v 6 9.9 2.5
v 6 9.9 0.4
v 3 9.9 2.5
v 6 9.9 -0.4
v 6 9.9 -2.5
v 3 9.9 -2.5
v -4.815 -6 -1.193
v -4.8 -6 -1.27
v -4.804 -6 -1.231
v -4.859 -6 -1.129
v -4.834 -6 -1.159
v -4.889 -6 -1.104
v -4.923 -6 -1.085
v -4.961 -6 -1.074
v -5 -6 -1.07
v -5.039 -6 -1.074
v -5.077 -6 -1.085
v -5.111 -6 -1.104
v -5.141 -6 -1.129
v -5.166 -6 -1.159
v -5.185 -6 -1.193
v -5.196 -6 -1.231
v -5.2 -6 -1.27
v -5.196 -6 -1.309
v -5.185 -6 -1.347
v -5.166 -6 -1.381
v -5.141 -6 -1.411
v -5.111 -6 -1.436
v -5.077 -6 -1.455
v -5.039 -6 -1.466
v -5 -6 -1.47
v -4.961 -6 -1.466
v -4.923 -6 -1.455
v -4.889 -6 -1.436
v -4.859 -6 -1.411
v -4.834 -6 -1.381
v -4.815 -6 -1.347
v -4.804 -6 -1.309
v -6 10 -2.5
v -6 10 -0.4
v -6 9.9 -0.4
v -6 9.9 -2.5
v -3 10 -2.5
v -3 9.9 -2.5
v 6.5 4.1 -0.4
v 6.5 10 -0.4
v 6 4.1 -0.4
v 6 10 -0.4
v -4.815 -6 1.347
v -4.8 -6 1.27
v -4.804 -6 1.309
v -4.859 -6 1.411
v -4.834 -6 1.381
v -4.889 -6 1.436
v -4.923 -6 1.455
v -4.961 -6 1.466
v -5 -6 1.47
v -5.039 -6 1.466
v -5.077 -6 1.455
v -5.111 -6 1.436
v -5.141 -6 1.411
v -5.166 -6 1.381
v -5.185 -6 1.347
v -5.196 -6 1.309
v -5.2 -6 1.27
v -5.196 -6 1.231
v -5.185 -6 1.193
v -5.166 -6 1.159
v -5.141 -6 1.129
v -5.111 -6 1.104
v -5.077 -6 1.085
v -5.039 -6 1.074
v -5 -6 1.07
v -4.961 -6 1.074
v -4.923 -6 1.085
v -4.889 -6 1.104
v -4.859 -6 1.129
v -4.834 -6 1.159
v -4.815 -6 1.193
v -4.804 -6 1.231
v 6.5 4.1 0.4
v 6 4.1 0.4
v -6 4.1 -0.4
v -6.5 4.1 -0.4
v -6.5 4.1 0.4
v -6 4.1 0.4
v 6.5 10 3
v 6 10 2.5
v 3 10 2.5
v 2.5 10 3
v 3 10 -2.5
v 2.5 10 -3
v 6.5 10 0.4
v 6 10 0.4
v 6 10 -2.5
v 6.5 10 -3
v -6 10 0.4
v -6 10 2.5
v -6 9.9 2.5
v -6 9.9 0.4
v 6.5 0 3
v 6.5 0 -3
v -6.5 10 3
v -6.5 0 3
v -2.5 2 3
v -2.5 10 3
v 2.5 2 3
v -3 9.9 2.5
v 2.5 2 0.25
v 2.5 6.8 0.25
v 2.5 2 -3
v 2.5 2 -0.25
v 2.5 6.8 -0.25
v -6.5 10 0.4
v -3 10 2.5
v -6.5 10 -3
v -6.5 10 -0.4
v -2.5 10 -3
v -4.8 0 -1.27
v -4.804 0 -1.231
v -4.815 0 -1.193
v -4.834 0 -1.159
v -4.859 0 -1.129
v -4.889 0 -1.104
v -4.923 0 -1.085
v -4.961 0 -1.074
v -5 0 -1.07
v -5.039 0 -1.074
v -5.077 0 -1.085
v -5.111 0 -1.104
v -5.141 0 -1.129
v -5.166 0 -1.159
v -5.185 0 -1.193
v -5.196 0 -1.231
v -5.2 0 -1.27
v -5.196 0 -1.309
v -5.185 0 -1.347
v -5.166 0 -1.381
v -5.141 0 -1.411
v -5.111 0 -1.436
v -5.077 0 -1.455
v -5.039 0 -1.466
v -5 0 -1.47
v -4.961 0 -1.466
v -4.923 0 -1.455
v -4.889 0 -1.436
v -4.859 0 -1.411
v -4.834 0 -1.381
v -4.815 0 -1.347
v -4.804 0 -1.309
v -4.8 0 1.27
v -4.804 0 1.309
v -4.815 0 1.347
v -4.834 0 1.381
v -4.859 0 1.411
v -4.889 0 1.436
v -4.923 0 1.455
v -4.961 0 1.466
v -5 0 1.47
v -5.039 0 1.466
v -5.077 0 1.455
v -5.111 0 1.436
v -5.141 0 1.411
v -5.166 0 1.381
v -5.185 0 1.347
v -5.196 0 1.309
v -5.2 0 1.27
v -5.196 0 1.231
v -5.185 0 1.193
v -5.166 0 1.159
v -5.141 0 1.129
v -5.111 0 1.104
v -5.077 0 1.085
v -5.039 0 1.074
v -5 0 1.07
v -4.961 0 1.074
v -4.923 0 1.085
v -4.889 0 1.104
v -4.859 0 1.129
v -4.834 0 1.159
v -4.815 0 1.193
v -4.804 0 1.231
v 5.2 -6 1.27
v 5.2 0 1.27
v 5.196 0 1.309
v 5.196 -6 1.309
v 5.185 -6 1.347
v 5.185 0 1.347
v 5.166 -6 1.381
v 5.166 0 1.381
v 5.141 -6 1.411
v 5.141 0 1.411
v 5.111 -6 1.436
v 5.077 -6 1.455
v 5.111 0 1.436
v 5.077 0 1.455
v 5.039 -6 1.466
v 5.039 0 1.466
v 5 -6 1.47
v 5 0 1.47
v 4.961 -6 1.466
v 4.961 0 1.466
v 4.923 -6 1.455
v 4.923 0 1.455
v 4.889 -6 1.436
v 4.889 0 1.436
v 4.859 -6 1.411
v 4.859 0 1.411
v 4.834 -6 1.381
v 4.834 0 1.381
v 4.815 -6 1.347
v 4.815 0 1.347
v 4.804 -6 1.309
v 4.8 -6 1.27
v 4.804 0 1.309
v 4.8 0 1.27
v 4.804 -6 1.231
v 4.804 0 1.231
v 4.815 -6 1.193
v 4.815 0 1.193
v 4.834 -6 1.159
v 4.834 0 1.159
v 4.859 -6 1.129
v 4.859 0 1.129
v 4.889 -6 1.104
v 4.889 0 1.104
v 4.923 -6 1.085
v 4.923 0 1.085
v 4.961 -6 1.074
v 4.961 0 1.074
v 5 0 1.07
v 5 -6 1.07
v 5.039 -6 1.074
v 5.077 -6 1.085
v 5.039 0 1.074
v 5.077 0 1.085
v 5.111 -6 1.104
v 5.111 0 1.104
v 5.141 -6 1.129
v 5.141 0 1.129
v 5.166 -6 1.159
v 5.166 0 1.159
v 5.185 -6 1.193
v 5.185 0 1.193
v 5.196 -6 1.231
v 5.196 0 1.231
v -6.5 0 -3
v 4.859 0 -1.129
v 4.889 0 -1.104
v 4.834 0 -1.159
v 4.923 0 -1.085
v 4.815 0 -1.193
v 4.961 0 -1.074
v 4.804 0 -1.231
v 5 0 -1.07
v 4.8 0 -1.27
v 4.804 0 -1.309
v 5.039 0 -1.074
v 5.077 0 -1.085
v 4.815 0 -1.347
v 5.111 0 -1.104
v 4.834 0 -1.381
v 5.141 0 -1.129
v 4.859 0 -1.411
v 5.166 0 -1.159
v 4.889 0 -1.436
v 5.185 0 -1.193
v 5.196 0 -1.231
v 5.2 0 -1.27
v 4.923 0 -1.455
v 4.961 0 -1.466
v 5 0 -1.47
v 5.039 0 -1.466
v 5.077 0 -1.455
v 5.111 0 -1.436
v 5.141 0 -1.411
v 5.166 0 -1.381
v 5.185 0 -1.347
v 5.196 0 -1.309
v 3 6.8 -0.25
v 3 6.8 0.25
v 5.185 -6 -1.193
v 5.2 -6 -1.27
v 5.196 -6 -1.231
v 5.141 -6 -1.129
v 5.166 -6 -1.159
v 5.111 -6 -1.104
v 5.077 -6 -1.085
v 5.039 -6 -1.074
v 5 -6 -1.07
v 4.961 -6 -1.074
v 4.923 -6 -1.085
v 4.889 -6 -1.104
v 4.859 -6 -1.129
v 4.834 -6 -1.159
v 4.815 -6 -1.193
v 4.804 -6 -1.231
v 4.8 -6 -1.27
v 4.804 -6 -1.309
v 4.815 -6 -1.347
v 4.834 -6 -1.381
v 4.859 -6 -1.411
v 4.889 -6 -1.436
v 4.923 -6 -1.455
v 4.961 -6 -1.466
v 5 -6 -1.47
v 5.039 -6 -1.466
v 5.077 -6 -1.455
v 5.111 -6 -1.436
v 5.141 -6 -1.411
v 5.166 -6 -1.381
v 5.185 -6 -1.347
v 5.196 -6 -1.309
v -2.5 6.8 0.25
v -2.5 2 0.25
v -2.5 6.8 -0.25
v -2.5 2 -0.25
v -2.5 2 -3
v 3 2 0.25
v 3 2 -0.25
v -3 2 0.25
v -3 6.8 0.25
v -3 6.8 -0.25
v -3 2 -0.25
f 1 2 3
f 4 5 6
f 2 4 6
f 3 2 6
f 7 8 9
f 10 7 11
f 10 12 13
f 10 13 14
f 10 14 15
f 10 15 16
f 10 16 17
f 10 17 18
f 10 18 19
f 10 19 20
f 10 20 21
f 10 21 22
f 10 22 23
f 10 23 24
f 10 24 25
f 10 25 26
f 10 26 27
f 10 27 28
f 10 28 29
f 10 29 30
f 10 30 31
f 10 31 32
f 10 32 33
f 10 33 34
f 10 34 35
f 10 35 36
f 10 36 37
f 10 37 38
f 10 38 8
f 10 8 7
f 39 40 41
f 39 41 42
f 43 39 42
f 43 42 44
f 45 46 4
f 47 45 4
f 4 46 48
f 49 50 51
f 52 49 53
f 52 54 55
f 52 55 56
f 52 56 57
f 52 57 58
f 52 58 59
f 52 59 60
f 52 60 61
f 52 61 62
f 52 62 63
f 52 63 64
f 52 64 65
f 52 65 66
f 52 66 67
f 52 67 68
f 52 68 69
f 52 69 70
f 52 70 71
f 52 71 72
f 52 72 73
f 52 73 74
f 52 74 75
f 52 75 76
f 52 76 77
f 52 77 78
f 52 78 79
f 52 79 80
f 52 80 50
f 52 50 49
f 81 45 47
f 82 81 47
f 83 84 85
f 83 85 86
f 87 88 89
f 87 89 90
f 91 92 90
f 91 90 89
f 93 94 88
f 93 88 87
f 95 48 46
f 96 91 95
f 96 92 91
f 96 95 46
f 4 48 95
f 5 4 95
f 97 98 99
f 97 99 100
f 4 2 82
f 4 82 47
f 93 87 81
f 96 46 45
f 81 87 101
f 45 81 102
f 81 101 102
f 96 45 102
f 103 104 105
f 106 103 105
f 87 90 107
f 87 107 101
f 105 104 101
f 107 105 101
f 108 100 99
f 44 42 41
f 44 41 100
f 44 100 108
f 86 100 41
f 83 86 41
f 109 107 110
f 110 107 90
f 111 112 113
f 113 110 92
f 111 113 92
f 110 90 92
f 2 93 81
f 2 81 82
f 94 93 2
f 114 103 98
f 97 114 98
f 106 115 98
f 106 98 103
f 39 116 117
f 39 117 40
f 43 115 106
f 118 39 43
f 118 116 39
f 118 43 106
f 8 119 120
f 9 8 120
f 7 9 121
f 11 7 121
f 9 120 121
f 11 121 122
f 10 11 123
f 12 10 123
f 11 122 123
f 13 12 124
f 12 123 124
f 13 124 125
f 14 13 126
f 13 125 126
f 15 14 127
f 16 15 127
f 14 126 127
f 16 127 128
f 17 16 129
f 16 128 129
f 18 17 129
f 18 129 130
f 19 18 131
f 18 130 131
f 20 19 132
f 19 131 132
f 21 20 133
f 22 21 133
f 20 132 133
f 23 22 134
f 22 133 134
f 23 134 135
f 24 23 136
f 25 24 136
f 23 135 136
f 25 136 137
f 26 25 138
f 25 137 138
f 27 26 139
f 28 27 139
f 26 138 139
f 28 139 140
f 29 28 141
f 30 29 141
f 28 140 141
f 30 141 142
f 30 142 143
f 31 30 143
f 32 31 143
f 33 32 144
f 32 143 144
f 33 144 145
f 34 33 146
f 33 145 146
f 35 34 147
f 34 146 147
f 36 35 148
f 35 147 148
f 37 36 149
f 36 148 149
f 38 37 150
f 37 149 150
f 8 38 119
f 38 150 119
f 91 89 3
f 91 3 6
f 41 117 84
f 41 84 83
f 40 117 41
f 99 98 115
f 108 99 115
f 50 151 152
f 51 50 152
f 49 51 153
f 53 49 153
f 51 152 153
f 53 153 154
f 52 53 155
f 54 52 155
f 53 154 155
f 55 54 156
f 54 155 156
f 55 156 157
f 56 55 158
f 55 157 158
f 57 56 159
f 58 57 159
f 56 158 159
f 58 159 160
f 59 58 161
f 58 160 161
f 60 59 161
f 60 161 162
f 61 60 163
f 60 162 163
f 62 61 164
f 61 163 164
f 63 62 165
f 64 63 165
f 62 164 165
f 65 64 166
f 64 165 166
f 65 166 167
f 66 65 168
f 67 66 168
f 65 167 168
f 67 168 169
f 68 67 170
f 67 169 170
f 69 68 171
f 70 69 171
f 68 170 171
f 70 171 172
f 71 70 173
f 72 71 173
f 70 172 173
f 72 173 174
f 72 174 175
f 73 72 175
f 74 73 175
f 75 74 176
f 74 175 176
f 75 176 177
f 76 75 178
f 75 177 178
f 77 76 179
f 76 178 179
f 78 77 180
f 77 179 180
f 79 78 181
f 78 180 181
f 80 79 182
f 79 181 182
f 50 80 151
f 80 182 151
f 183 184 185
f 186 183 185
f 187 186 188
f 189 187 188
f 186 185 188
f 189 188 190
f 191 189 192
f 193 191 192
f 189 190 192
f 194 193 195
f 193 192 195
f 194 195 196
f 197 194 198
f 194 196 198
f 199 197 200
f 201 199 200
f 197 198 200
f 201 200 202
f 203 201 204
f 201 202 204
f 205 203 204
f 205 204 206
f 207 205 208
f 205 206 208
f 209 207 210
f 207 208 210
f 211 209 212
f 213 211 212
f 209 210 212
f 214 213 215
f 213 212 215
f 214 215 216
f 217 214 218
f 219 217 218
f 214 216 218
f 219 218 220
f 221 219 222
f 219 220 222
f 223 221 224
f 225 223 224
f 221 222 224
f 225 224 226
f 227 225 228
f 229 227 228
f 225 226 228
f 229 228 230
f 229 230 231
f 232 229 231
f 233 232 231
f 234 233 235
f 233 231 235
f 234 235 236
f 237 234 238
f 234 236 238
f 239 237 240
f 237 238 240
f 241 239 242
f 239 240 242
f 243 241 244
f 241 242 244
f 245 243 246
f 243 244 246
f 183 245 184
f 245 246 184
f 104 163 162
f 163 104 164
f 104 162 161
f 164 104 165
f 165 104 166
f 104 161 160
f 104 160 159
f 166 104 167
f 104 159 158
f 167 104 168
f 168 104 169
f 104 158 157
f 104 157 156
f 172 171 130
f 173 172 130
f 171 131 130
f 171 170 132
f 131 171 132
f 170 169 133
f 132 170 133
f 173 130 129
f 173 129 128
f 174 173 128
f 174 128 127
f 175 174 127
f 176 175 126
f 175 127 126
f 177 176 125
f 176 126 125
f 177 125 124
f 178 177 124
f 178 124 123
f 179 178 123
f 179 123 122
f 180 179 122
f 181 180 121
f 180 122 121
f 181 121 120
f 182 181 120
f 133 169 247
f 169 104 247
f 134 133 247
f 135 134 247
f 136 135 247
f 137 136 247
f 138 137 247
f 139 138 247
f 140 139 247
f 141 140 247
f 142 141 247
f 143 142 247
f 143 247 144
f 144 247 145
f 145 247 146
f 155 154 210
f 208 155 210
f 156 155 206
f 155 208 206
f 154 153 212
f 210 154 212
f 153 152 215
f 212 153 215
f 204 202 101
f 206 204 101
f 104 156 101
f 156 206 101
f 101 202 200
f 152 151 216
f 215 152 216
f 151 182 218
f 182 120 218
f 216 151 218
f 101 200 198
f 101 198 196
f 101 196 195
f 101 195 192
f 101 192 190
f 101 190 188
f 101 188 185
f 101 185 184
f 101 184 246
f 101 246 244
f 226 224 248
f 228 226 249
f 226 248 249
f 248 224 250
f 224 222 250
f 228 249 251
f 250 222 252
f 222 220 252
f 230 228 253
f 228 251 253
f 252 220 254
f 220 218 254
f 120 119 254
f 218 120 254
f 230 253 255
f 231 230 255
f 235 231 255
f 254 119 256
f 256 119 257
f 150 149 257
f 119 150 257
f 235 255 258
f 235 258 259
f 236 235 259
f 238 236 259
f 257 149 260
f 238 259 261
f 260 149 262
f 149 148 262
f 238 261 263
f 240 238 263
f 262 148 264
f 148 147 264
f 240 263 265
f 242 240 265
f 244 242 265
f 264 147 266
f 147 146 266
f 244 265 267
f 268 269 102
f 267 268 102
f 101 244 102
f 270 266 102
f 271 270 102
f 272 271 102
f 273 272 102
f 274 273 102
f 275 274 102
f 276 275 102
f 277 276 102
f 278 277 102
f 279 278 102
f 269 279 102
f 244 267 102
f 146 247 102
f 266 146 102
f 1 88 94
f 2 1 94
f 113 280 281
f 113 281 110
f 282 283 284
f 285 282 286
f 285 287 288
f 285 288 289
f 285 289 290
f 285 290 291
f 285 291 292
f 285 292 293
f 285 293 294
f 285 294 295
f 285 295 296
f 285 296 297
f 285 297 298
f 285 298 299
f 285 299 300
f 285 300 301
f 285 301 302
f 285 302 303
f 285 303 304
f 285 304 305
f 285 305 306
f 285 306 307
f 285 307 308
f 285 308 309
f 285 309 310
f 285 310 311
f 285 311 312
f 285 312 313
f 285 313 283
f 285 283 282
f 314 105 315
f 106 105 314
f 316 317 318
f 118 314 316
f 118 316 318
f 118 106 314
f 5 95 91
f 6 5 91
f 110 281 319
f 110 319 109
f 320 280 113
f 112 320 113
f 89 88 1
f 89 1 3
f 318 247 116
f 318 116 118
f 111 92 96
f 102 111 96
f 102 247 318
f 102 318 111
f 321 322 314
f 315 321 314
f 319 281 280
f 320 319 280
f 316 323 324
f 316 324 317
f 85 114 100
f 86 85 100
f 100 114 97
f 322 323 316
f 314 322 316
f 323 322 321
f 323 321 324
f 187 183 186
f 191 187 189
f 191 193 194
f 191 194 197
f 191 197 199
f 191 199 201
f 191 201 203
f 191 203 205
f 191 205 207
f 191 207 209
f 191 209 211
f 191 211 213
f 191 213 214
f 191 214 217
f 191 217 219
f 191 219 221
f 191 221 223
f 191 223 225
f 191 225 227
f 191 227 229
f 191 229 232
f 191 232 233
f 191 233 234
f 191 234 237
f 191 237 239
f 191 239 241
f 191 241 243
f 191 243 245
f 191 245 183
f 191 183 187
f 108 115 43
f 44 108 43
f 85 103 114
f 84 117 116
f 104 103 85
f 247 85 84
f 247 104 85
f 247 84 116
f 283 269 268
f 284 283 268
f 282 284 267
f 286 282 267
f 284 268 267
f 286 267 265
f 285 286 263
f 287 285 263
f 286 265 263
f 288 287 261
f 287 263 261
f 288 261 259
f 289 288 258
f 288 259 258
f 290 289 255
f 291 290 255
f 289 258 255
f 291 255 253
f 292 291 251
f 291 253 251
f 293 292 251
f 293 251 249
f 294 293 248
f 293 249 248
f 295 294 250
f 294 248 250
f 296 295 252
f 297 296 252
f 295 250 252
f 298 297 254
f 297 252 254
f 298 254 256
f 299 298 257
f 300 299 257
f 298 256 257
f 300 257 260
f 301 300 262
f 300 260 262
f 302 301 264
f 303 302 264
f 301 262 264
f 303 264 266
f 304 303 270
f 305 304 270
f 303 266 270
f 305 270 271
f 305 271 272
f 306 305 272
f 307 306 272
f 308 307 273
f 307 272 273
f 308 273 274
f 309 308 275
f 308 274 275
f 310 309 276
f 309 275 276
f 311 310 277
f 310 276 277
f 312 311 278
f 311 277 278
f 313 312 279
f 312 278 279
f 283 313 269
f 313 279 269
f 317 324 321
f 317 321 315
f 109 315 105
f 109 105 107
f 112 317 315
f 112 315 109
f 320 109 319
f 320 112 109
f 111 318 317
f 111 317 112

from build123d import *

# Parameters (mm, degrees)
ESBO_O2_W                = 13
ESBO_O2_H                = 6
RESSALTO_EXTRUS_O1_DEPTH = 10
ESBO_O3_W                = 5
ESBO_O3_H                = 6
CORTE_EXTRUS_O1_DEPTH    = 8
ESBO_O4_W                = 3
ESBO_O4_H                = 5
CORTE_EXTRUS_O2_DEPTH    = 0.1
ESBO_O5_W                = 1
ESBO_O5_H                = 0.8
CORTE_EXTRUS_O3_DEPTH    = 5.9
ESBO_O6_W                = 1
ESBO_O6_H                = 0.5
CORTE_EXTRUS_O4_DEPTH    = 4.8
ESBO_O7_R                = 0.2
RESSALTO_EXTRUS_O2_DEPTH = 6


with BuildPart() as part:
    # Esboço2 → Ressalto-extrusão1 (new body)
    with BuildSketch(Plane(origin=(0, 0, 0), x_dir=(1, 0, 0), z_dir=(0, 1, 0))):
        Rectangle(ESBO_O2_W, ESBO_O2_H)
    extrude(amount=RESSALTO_EXTRUS_O1_DEPTH)

    # Esboço3 → Corte-extrusão1 (cut)
    with BuildSketch(Plane(origin=(0, 10, 0), x_dir=(1, 0, 0), z_dir=(0, 1, 0))):
        Rectangle(ESBO_O3_W, ESBO_O3_H)
    extrude(amount=-CORTE_EXTRUS_O1_DEPTH, mode=Mode.SUBTRACT)

    # Esboço4 → Corte-extrusão2 (cut)
    with BuildSketch(Plane(origin=(0, 10, 0), x_dir=(1, 0, 0), z_dir=(0, 1, 0))):
        with Locations((-4.5, 0)):
            Rectangle(ESBO_O4_W, ESBO_O4_H)
    corte_extrus_o2 = extrude(amount=-CORTE_EXTRUS_O2_DEPTH, mode=Mode.SUBTRACT)

    # Espelhar1: Corte-extrusão2 across plane
    add(corte_extrus_o2.mirror(Plane(origin=(0, 0, 0), x_dir=(0, 0, 1), z_dir=(1, 0, 0))), mode=Mode.SUBTRACT)

    # Esboço5 → Corte-extrusão3 (cut)
    with BuildSketch(Plane(origin=(0, 10, 0), x_dir=(1, 0, 0), z_dir=(0, 1, 0))):
        with Locations((-6.5, 0)):
            Rectangle(ESBO_O5_W, ESBO_O5_H)
    corte_extrus_o3 = extrude(amount=-CORTE_EXTRUS_O3_DEPTH, mode=Mode.SUBTRACT)

    # Espelhar2: Corte-extrusão3 across plane
    add(corte_extrus_o3.mirror(Plane(origin=(0, 0, 0), x_dir=(0, 0, 1), z_dir=(1, 0, 0))), mode=Mode.SUBTRACT)

    # Esboço6 → Corte-extrusão4 (cut)
    with BuildSketch(Plane(origin=(0, 6.8, 0), x_dir=(1, 0, 0), z_dir=(0, 1, 0))):
        with Locations((-2.5, 0)):
            Rectangle(ESBO_O6_W, ESBO_O6_H)
    corte_extrus_o4 = extrude(amount=-CORTE_EXTRUS_O4_DEPTH, mode=Mode.SUBTRACT)

    # Espelhar3: Corte-extrusão4 across plane
    add(corte_extrus_o4.mirror(Plane(origin=(0, 0, 0), x_dir=(0, 0, 1), z_dir=(1, 0, 0))), mode=Mode.SUBTRACT)

    # Esboço7 → Ressalto-extrusão2 (add)
    with BuildSketch(Plane.XZ):
        with Locations((-5, 1.27)):
            Circle(ESBO_O7_R)
        with Locations((5, 1.27)):
            Circle(ESBO_O7_R)
        with Locations((5, -1.27)):
            Circle(ESBO_O7_R)
        with Locations((-5, -1.27)):
            Circle(ESBO_O7_R)
    extrude(amount=RESSALTO_EXTRUS_O2_DEPTH)


solid = part.part
